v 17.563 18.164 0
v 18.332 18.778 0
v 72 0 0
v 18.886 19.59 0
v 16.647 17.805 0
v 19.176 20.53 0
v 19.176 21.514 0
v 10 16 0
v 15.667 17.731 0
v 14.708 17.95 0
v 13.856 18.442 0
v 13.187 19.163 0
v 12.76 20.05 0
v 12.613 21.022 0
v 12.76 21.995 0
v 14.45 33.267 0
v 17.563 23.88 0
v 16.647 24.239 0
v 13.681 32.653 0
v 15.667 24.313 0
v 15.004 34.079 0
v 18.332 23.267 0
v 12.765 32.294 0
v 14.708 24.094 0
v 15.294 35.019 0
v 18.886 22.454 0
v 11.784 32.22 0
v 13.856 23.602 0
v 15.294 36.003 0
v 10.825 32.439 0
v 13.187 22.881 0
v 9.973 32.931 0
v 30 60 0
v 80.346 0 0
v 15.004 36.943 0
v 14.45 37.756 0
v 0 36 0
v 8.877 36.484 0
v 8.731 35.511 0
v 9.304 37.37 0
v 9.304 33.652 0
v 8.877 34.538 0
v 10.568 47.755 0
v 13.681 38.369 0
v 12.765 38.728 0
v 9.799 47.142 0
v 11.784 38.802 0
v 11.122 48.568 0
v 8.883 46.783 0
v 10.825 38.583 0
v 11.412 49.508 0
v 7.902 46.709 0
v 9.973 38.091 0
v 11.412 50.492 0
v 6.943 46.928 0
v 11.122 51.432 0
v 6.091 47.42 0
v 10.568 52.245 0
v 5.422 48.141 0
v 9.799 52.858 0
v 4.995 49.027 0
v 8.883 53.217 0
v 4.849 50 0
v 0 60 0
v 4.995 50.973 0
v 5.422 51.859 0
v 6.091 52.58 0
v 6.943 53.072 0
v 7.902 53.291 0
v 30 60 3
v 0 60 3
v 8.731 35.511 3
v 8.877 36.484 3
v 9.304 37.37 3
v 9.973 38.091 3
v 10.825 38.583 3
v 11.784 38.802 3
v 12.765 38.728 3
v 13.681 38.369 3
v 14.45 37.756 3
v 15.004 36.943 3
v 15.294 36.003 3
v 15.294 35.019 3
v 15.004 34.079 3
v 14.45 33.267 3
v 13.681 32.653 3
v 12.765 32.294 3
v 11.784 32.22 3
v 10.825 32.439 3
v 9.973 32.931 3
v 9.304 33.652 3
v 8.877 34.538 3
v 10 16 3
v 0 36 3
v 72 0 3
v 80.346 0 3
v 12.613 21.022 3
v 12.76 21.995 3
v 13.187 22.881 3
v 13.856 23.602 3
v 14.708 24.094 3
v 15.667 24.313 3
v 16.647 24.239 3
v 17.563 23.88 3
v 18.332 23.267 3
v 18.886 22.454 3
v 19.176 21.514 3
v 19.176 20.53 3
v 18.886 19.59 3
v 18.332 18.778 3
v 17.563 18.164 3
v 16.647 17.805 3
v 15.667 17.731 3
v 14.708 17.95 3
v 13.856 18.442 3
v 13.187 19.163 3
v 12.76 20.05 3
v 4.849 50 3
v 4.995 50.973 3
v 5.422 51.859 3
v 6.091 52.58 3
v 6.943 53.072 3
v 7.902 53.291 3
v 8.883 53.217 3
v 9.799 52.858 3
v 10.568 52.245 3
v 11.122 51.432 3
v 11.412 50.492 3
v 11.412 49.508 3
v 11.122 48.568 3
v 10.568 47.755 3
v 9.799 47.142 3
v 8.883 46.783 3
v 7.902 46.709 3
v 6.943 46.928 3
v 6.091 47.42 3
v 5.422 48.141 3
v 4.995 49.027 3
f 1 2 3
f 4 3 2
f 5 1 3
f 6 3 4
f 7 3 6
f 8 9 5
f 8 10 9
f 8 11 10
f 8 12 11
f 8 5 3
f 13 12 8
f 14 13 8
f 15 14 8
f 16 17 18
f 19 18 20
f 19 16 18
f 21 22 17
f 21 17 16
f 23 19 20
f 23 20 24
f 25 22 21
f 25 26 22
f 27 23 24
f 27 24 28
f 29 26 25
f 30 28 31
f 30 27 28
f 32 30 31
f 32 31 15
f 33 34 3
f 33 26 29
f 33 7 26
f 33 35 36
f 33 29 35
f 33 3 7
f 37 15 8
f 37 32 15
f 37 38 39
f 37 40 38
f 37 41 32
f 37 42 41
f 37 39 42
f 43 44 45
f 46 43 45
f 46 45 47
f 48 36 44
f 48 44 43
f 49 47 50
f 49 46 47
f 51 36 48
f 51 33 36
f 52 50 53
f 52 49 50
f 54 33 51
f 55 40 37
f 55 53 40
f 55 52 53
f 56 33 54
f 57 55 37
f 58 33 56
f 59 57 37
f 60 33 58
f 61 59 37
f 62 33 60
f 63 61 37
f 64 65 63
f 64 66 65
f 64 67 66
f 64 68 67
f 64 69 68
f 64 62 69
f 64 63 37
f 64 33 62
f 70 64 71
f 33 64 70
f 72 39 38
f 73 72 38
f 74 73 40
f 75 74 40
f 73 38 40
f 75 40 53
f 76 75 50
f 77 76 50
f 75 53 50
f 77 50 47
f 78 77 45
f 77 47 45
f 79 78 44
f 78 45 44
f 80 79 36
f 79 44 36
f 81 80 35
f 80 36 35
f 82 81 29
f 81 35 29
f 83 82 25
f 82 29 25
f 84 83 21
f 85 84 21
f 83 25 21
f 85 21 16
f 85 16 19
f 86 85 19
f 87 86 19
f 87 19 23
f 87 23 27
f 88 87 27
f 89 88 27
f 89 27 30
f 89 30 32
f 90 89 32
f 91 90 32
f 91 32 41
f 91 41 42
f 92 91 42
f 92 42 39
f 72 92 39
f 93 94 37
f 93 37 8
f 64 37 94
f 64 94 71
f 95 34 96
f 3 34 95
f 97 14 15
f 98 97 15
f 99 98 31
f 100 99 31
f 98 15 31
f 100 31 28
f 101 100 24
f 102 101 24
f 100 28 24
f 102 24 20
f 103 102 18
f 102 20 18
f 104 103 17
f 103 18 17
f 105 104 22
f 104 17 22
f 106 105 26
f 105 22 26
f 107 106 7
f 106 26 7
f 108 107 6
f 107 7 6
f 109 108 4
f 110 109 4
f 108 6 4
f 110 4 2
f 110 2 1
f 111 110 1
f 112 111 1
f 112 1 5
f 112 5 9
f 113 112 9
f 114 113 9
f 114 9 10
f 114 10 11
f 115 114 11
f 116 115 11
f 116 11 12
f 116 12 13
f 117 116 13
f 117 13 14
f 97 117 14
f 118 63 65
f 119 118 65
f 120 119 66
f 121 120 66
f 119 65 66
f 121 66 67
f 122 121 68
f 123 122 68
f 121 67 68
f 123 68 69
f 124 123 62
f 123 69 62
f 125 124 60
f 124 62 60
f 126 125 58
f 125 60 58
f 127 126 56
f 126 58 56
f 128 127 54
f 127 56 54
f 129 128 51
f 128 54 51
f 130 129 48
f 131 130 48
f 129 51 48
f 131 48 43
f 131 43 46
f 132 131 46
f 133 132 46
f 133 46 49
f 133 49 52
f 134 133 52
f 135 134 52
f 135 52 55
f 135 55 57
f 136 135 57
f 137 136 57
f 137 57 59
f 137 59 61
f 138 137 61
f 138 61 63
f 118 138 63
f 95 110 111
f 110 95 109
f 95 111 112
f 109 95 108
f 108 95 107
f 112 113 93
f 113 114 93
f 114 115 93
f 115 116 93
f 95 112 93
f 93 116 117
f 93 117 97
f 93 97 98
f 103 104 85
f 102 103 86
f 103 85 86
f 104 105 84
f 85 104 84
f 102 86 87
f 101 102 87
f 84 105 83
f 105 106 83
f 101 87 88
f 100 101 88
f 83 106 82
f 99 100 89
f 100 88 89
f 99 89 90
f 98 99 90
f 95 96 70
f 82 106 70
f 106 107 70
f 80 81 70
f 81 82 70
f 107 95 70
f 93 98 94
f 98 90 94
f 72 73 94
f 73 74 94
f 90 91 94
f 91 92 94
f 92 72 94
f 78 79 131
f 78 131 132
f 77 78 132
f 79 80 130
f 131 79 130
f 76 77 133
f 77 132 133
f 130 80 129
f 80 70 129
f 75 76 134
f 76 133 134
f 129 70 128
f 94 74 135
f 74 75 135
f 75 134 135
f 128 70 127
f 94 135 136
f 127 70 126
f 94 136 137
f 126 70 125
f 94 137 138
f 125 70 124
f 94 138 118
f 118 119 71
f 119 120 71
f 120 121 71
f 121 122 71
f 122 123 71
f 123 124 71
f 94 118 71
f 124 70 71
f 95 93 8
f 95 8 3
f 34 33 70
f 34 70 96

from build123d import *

# Parameters (mm, degrees)
RESSALTO_EXTRUS_O1_DEPTH = 3
FURO_COM_FOLGA_DE_M61_D  = 6.6
CORTE_EXTRUS_O1_DEPTH    = 101.321862822


with BuildPart() as part:
    # Esboço1 → Ressalto-extrusão1 (new body)
    with BuildSketch(Plane.XY):
        Polygon((0, 0), (0, 60), (30, 60), (80.345977871, 0), align=None)
    extrude(amount=RESSALTO_EXTRUS_O1_DEPTH)

    # Furo com folga de M61 (through all)
    with Locations(Plane.XY.offset(3)):
        with Locations((15.913142528, 21.022225211), (12.030856852, 35.511112606), (8.148571175, 50)):
            Hole(FURO_COM_FOLGA_DE_M61_D / 2)

    # Esboço4 → Corte-extrusão1 (cut, through all)
    with BuildSketch(Plane.XY.offset(3)):
        Polygon((0, 36), (10, 16), (72, 0), (0, 0), align=None)
    extrude(amount=-CORTE_EXTRUS_O1_DEPTH, mode=Mode.SUBTRACT)


solid = part.part
